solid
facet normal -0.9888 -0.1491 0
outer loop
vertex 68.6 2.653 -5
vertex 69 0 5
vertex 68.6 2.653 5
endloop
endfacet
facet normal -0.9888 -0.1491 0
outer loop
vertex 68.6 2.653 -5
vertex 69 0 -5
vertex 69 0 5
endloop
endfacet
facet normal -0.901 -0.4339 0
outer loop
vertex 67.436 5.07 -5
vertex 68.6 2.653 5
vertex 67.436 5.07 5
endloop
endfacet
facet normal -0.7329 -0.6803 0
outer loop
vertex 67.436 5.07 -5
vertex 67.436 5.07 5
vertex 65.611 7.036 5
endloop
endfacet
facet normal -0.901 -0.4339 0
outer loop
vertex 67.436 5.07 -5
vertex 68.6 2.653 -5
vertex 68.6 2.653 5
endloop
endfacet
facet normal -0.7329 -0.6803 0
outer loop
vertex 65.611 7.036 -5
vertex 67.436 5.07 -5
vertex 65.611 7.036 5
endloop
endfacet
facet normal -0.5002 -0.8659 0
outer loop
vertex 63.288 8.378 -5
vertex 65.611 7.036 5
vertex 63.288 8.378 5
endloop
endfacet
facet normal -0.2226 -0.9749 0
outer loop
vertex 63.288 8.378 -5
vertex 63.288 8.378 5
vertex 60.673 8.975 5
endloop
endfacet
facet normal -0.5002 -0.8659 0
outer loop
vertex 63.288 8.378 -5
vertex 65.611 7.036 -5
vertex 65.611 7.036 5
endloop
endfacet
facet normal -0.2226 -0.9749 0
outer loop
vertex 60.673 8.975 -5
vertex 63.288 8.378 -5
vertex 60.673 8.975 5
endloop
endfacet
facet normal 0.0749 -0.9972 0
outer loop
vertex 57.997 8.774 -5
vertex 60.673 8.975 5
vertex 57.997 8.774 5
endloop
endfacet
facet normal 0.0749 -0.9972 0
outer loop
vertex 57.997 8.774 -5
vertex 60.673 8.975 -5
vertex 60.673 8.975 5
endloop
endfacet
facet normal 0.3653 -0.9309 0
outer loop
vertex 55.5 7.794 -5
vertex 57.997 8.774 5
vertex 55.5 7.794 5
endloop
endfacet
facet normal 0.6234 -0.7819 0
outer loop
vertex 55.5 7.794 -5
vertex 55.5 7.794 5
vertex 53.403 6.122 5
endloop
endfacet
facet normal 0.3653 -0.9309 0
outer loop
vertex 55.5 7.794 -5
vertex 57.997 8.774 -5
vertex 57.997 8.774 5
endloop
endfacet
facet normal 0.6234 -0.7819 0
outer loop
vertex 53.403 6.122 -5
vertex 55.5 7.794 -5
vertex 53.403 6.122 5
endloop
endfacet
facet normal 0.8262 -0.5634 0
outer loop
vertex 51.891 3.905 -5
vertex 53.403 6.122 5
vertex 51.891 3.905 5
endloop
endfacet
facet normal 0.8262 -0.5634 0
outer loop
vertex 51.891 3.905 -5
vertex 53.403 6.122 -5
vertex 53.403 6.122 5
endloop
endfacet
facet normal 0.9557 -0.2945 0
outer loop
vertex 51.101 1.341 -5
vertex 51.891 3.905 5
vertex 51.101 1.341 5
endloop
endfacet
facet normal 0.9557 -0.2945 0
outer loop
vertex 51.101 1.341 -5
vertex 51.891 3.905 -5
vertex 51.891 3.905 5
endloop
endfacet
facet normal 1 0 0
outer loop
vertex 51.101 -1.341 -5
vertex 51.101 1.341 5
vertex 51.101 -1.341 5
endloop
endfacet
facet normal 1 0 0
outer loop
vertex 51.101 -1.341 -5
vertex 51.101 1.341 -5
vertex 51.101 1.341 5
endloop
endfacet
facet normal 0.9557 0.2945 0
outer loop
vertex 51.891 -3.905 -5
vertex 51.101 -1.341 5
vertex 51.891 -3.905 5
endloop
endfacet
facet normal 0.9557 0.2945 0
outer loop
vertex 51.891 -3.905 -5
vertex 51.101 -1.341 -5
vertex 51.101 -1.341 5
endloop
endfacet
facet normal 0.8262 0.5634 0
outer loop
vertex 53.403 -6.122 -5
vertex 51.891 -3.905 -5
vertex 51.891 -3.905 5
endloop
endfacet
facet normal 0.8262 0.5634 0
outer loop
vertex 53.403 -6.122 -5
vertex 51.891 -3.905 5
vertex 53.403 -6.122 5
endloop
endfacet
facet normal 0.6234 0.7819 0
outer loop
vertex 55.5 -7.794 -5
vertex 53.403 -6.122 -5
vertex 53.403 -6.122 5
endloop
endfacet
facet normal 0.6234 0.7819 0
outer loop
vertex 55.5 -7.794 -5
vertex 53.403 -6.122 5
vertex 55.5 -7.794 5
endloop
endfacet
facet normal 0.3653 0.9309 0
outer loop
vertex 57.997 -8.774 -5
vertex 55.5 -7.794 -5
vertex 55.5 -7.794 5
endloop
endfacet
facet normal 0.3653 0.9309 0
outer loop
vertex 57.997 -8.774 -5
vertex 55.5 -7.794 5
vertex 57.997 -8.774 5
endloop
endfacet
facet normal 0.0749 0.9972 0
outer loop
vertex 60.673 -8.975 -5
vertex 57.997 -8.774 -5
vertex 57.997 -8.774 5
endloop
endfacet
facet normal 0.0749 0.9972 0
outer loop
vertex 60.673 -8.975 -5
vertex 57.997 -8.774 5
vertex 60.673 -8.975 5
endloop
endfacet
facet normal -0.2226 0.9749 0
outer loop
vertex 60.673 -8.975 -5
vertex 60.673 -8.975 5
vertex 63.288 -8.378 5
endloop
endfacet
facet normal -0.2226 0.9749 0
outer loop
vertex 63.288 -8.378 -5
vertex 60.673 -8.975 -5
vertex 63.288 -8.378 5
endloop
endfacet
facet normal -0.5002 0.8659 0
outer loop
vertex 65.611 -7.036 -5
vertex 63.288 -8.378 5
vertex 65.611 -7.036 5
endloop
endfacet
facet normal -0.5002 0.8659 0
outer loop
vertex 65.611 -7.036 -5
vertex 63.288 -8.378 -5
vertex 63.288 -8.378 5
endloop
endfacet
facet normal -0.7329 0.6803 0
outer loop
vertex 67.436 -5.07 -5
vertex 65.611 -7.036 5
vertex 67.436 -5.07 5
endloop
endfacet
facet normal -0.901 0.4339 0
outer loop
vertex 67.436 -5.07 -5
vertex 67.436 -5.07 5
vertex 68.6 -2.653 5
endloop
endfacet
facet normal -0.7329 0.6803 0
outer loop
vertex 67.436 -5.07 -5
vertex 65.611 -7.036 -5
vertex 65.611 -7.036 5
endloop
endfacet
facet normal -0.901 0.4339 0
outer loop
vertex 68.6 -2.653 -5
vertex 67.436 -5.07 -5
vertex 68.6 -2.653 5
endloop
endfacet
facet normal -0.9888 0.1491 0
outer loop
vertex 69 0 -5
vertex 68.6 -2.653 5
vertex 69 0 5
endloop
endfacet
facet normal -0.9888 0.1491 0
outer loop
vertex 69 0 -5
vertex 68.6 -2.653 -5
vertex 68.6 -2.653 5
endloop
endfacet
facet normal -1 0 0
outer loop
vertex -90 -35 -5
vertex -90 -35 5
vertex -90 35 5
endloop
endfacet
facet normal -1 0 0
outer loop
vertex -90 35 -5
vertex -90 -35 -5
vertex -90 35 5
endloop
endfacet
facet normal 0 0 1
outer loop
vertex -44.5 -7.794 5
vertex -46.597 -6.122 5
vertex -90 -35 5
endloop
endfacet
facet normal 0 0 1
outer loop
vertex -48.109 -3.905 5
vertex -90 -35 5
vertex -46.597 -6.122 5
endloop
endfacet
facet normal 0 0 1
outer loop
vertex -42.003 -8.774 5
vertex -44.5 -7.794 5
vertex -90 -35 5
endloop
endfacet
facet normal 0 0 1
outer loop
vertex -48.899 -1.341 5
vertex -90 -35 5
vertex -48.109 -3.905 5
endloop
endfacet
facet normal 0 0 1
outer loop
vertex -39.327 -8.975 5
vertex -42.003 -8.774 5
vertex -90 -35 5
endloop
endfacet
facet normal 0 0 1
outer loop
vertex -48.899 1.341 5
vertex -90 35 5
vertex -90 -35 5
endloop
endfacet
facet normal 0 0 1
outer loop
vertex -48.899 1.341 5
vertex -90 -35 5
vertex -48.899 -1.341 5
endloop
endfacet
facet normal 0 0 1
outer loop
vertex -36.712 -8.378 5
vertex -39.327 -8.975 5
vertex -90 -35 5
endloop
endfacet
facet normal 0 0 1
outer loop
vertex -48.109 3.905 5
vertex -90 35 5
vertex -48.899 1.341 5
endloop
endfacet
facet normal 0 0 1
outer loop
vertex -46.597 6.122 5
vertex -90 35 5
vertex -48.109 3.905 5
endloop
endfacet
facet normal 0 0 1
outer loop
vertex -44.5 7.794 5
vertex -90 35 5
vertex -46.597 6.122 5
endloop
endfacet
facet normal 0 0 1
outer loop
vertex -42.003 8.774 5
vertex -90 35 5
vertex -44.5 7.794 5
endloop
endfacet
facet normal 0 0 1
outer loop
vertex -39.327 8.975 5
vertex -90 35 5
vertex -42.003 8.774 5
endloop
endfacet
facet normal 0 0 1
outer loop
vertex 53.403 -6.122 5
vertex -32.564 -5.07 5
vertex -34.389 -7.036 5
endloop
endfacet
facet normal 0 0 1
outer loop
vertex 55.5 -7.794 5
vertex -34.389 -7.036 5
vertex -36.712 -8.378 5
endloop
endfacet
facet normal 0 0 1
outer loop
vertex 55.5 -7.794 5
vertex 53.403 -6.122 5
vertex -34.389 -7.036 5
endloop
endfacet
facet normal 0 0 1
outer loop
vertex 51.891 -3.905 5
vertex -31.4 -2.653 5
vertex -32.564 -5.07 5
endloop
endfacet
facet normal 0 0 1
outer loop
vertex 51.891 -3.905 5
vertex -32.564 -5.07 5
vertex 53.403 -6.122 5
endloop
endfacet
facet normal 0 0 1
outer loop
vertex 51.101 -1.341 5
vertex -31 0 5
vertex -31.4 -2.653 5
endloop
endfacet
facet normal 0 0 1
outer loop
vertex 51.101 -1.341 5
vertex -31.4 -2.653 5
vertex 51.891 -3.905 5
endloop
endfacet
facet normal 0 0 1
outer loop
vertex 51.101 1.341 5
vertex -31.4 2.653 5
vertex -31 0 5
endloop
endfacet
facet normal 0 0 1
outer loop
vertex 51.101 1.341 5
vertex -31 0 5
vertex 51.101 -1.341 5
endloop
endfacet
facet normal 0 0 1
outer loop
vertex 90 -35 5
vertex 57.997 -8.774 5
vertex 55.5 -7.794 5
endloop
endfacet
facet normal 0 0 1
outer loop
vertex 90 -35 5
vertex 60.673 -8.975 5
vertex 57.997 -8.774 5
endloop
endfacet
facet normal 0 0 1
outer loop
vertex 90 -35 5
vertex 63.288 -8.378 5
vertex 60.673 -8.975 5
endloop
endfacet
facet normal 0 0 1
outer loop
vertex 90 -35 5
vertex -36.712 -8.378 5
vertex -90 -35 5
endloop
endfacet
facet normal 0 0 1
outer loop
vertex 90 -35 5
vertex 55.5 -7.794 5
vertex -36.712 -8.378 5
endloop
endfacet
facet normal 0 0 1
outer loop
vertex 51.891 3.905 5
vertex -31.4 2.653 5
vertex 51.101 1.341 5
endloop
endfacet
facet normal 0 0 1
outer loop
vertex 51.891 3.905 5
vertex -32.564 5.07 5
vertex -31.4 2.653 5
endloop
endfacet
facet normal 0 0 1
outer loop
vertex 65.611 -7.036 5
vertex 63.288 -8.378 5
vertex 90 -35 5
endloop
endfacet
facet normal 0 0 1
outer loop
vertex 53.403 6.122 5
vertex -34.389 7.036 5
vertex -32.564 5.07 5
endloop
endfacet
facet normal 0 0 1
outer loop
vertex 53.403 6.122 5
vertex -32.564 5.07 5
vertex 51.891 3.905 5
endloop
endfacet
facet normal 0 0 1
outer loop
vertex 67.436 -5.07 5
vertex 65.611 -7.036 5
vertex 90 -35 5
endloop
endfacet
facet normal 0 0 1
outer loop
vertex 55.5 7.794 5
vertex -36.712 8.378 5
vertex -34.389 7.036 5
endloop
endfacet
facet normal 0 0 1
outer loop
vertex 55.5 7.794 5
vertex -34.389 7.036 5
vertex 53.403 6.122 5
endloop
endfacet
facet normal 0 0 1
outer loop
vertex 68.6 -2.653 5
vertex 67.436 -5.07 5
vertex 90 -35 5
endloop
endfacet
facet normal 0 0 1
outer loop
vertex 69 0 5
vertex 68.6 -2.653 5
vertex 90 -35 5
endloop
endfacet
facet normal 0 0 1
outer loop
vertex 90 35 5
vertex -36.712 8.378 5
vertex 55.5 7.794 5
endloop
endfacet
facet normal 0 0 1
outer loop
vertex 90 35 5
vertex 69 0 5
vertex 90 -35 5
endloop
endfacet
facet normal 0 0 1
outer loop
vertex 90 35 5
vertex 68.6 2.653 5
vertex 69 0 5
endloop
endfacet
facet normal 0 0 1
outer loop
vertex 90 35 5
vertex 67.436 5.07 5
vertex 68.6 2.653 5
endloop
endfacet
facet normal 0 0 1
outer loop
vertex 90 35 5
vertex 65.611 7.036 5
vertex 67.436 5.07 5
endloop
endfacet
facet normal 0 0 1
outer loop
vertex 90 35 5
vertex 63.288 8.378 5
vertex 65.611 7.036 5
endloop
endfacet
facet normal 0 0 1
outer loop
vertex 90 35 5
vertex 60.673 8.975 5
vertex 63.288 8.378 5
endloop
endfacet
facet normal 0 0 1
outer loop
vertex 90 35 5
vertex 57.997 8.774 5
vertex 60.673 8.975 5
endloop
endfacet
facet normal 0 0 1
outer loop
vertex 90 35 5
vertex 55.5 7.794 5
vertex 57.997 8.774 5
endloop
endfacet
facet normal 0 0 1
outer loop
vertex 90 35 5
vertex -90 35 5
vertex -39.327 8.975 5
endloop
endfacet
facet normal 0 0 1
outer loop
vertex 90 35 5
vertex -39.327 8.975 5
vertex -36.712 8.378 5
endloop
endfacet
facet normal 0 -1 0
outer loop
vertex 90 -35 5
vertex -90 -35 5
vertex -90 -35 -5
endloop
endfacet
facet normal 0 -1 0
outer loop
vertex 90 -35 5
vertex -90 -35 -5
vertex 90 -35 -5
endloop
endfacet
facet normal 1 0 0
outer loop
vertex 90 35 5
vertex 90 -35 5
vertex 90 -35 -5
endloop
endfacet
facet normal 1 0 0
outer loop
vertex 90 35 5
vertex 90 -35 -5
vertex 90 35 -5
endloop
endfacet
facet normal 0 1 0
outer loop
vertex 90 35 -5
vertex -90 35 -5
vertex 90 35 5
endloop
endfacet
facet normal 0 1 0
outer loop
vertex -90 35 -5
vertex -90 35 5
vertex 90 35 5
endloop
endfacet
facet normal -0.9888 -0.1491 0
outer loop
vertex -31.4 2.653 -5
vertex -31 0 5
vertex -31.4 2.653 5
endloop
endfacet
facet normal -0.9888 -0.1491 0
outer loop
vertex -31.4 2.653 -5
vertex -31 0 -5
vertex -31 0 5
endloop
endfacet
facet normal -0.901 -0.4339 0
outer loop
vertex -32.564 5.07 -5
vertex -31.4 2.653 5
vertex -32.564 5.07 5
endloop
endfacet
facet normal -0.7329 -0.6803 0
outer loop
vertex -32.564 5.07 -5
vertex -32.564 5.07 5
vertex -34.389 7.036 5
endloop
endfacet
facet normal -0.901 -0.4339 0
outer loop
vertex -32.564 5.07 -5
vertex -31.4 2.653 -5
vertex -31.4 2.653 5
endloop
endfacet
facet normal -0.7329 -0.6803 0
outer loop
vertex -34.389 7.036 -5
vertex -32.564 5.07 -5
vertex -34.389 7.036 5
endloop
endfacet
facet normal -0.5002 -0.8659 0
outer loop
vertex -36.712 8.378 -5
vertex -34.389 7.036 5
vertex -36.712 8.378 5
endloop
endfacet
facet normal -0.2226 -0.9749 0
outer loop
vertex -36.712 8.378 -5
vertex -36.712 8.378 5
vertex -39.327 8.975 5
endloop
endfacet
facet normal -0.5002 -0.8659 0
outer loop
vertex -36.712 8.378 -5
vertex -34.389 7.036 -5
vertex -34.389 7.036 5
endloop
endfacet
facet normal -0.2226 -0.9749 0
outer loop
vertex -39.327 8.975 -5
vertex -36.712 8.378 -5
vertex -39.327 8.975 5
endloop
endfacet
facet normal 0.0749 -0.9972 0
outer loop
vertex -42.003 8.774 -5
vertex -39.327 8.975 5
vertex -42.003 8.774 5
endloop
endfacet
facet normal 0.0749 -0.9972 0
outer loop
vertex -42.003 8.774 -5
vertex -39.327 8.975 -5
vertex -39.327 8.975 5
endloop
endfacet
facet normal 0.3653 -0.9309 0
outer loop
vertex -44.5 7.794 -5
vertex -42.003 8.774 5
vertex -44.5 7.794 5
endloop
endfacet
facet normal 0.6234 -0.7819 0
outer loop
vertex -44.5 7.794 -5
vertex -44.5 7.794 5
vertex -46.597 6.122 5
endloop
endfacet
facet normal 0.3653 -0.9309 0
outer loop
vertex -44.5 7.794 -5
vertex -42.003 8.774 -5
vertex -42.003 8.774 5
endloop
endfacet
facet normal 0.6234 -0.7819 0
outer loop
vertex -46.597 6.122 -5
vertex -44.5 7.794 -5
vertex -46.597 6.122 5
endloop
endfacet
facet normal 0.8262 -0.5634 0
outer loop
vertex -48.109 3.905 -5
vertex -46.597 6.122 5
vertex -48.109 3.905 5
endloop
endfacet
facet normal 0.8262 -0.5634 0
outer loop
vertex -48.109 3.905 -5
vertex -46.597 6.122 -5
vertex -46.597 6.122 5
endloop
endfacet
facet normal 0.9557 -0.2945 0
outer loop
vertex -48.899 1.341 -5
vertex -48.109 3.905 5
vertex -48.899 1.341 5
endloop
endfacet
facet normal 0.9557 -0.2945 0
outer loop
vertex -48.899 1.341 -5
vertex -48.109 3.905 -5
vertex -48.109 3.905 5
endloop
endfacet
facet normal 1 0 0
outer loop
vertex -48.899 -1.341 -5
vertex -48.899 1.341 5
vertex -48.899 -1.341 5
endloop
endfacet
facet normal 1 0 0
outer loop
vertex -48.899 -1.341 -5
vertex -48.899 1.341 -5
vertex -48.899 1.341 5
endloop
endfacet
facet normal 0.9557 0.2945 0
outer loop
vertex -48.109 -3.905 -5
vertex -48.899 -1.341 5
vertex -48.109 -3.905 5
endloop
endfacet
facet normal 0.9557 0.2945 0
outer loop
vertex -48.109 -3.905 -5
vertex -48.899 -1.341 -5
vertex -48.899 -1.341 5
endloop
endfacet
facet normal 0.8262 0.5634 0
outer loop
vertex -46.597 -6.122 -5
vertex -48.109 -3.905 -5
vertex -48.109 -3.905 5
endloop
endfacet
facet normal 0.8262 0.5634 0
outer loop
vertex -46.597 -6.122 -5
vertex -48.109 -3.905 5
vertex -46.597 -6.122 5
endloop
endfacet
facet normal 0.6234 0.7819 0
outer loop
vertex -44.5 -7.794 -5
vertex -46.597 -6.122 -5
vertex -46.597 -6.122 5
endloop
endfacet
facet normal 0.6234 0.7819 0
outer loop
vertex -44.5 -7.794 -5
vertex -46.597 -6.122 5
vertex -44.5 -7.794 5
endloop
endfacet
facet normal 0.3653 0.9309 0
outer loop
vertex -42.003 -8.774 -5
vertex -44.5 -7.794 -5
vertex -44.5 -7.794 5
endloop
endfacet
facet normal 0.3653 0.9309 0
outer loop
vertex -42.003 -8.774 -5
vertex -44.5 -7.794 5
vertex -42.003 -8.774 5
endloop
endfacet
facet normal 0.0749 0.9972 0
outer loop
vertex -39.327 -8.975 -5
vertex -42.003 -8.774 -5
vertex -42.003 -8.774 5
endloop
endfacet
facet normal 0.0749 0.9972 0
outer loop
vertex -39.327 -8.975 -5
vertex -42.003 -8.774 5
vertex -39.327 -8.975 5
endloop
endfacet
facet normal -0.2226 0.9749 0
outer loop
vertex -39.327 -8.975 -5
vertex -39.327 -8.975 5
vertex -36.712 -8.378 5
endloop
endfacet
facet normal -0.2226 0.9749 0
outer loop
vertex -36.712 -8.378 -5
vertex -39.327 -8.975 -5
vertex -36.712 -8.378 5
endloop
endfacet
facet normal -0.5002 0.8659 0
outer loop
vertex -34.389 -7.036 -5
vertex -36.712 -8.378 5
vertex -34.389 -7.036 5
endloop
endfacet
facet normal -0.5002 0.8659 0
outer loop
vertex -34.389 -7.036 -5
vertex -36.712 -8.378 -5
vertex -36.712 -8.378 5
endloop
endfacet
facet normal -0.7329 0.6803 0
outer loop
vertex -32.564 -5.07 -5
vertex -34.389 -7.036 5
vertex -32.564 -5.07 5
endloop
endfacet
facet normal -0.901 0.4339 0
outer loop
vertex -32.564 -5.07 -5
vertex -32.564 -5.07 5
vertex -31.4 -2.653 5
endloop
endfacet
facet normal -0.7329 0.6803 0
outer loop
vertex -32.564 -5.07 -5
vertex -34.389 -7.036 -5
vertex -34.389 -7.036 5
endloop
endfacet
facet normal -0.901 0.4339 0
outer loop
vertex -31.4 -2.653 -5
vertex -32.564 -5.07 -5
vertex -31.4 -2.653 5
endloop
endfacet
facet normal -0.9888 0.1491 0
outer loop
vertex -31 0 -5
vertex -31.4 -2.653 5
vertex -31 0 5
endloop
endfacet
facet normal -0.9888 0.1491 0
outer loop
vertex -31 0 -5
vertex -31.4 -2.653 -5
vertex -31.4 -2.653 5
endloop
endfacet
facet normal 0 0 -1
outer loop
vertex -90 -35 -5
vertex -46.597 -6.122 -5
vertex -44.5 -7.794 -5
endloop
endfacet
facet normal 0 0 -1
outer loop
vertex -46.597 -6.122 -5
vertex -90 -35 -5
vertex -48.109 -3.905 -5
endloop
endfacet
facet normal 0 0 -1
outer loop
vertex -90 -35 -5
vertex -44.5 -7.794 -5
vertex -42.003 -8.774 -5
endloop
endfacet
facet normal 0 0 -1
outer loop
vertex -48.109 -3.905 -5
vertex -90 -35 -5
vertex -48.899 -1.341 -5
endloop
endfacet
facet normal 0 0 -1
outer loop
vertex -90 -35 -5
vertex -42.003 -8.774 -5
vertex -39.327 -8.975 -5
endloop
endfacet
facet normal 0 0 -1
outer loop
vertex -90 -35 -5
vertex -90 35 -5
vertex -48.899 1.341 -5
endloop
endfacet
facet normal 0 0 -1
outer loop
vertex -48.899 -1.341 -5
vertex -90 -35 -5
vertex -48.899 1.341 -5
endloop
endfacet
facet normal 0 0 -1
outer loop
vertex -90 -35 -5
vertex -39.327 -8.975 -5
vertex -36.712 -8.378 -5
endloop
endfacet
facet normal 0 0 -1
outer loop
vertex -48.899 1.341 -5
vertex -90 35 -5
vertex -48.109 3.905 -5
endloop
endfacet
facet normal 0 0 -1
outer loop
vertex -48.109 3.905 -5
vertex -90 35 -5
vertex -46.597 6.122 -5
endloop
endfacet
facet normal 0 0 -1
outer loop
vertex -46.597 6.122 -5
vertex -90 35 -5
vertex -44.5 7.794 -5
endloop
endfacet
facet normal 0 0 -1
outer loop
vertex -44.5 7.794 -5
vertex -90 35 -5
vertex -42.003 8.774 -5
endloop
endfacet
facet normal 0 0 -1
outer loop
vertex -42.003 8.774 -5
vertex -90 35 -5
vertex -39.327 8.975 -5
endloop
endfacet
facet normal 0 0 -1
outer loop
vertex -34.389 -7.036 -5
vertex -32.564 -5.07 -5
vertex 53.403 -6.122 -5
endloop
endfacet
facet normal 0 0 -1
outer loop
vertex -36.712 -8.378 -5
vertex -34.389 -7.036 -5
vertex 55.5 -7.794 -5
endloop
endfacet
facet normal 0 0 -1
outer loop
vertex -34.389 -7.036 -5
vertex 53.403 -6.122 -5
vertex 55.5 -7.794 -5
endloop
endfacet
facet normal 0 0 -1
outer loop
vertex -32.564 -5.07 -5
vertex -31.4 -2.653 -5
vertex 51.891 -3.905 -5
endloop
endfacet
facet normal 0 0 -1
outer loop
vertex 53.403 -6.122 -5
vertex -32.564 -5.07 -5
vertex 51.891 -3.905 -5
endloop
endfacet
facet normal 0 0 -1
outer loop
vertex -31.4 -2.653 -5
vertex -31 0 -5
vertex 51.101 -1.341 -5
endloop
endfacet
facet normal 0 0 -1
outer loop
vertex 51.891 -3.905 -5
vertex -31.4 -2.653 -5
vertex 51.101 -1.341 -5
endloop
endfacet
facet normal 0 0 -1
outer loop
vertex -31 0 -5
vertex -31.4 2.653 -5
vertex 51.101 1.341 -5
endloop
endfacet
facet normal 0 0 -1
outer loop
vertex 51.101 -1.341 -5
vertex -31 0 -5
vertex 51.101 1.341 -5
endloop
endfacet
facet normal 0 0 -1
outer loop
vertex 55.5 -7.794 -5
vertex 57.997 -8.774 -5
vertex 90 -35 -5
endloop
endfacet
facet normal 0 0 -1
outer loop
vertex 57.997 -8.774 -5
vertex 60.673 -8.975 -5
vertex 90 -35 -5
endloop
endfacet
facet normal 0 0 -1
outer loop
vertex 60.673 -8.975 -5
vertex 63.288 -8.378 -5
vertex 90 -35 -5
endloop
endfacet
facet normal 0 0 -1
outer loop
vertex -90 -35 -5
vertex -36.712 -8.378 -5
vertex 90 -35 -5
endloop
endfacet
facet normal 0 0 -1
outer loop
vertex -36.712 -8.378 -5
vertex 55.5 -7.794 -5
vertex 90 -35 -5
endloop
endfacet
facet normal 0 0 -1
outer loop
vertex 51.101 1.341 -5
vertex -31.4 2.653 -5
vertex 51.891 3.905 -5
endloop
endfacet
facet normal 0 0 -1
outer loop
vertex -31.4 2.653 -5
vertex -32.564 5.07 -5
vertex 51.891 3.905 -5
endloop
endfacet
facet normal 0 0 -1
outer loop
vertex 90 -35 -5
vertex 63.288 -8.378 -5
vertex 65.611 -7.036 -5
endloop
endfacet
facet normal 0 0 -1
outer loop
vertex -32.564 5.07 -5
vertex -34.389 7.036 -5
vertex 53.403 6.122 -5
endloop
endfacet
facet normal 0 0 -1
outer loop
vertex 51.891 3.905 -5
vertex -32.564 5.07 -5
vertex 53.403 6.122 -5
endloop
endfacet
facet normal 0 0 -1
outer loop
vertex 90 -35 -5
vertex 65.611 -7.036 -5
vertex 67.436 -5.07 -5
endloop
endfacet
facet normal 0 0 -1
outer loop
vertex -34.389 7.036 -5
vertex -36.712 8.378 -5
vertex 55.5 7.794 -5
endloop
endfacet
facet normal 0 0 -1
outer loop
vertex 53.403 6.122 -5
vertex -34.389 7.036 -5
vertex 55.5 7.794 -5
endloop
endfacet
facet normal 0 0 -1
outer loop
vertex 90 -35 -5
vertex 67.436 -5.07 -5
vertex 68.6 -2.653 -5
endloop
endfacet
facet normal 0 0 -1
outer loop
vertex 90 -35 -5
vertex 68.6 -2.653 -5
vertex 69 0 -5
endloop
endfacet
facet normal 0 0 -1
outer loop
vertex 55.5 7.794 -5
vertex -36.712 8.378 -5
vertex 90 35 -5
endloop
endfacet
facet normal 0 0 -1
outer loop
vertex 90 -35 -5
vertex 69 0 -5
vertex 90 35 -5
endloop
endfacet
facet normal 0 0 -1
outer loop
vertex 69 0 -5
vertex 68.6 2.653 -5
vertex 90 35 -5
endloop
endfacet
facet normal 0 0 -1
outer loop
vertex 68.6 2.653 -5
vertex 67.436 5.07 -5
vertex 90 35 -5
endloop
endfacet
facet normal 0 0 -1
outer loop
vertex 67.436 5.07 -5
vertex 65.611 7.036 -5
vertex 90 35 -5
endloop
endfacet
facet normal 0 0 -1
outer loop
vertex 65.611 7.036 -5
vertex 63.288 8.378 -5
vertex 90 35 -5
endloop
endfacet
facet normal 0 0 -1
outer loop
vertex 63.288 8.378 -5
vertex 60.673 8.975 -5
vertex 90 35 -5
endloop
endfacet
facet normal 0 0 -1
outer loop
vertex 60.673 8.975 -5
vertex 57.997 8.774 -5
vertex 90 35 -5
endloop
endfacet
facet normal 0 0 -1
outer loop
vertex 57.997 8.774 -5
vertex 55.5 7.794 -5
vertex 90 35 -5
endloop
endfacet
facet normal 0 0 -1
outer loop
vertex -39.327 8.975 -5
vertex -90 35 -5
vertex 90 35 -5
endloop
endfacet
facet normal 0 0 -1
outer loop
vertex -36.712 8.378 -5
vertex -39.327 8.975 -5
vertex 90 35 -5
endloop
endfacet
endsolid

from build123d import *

# Parameters (mm, degrees)
SKETCH1_W           = 180
SKETCH1_H           = 70
SKETCH1_R           = 9
BOSS_EXTRUDE1_DEPTH = 5


with BuildPart() as part:
    # Sketch1 → Boss-Extrude1 (new, symmetric)
    with BuildSketch(Plane.XY):
        Rectangle(SKETCH1_W, SKETCH1_H)
        with Locations((60, 0)):
            Circle(SKETCH1_R, mode=Mode.SUBTRACT)
        with Locations((-40, 0)):
            Circle(SKETCH1_R, mode=Mode.SUBTRACT)
    extrude(amount=BOSS_EXTRUDE1_DEPTH, both=True)


solid = part.part
